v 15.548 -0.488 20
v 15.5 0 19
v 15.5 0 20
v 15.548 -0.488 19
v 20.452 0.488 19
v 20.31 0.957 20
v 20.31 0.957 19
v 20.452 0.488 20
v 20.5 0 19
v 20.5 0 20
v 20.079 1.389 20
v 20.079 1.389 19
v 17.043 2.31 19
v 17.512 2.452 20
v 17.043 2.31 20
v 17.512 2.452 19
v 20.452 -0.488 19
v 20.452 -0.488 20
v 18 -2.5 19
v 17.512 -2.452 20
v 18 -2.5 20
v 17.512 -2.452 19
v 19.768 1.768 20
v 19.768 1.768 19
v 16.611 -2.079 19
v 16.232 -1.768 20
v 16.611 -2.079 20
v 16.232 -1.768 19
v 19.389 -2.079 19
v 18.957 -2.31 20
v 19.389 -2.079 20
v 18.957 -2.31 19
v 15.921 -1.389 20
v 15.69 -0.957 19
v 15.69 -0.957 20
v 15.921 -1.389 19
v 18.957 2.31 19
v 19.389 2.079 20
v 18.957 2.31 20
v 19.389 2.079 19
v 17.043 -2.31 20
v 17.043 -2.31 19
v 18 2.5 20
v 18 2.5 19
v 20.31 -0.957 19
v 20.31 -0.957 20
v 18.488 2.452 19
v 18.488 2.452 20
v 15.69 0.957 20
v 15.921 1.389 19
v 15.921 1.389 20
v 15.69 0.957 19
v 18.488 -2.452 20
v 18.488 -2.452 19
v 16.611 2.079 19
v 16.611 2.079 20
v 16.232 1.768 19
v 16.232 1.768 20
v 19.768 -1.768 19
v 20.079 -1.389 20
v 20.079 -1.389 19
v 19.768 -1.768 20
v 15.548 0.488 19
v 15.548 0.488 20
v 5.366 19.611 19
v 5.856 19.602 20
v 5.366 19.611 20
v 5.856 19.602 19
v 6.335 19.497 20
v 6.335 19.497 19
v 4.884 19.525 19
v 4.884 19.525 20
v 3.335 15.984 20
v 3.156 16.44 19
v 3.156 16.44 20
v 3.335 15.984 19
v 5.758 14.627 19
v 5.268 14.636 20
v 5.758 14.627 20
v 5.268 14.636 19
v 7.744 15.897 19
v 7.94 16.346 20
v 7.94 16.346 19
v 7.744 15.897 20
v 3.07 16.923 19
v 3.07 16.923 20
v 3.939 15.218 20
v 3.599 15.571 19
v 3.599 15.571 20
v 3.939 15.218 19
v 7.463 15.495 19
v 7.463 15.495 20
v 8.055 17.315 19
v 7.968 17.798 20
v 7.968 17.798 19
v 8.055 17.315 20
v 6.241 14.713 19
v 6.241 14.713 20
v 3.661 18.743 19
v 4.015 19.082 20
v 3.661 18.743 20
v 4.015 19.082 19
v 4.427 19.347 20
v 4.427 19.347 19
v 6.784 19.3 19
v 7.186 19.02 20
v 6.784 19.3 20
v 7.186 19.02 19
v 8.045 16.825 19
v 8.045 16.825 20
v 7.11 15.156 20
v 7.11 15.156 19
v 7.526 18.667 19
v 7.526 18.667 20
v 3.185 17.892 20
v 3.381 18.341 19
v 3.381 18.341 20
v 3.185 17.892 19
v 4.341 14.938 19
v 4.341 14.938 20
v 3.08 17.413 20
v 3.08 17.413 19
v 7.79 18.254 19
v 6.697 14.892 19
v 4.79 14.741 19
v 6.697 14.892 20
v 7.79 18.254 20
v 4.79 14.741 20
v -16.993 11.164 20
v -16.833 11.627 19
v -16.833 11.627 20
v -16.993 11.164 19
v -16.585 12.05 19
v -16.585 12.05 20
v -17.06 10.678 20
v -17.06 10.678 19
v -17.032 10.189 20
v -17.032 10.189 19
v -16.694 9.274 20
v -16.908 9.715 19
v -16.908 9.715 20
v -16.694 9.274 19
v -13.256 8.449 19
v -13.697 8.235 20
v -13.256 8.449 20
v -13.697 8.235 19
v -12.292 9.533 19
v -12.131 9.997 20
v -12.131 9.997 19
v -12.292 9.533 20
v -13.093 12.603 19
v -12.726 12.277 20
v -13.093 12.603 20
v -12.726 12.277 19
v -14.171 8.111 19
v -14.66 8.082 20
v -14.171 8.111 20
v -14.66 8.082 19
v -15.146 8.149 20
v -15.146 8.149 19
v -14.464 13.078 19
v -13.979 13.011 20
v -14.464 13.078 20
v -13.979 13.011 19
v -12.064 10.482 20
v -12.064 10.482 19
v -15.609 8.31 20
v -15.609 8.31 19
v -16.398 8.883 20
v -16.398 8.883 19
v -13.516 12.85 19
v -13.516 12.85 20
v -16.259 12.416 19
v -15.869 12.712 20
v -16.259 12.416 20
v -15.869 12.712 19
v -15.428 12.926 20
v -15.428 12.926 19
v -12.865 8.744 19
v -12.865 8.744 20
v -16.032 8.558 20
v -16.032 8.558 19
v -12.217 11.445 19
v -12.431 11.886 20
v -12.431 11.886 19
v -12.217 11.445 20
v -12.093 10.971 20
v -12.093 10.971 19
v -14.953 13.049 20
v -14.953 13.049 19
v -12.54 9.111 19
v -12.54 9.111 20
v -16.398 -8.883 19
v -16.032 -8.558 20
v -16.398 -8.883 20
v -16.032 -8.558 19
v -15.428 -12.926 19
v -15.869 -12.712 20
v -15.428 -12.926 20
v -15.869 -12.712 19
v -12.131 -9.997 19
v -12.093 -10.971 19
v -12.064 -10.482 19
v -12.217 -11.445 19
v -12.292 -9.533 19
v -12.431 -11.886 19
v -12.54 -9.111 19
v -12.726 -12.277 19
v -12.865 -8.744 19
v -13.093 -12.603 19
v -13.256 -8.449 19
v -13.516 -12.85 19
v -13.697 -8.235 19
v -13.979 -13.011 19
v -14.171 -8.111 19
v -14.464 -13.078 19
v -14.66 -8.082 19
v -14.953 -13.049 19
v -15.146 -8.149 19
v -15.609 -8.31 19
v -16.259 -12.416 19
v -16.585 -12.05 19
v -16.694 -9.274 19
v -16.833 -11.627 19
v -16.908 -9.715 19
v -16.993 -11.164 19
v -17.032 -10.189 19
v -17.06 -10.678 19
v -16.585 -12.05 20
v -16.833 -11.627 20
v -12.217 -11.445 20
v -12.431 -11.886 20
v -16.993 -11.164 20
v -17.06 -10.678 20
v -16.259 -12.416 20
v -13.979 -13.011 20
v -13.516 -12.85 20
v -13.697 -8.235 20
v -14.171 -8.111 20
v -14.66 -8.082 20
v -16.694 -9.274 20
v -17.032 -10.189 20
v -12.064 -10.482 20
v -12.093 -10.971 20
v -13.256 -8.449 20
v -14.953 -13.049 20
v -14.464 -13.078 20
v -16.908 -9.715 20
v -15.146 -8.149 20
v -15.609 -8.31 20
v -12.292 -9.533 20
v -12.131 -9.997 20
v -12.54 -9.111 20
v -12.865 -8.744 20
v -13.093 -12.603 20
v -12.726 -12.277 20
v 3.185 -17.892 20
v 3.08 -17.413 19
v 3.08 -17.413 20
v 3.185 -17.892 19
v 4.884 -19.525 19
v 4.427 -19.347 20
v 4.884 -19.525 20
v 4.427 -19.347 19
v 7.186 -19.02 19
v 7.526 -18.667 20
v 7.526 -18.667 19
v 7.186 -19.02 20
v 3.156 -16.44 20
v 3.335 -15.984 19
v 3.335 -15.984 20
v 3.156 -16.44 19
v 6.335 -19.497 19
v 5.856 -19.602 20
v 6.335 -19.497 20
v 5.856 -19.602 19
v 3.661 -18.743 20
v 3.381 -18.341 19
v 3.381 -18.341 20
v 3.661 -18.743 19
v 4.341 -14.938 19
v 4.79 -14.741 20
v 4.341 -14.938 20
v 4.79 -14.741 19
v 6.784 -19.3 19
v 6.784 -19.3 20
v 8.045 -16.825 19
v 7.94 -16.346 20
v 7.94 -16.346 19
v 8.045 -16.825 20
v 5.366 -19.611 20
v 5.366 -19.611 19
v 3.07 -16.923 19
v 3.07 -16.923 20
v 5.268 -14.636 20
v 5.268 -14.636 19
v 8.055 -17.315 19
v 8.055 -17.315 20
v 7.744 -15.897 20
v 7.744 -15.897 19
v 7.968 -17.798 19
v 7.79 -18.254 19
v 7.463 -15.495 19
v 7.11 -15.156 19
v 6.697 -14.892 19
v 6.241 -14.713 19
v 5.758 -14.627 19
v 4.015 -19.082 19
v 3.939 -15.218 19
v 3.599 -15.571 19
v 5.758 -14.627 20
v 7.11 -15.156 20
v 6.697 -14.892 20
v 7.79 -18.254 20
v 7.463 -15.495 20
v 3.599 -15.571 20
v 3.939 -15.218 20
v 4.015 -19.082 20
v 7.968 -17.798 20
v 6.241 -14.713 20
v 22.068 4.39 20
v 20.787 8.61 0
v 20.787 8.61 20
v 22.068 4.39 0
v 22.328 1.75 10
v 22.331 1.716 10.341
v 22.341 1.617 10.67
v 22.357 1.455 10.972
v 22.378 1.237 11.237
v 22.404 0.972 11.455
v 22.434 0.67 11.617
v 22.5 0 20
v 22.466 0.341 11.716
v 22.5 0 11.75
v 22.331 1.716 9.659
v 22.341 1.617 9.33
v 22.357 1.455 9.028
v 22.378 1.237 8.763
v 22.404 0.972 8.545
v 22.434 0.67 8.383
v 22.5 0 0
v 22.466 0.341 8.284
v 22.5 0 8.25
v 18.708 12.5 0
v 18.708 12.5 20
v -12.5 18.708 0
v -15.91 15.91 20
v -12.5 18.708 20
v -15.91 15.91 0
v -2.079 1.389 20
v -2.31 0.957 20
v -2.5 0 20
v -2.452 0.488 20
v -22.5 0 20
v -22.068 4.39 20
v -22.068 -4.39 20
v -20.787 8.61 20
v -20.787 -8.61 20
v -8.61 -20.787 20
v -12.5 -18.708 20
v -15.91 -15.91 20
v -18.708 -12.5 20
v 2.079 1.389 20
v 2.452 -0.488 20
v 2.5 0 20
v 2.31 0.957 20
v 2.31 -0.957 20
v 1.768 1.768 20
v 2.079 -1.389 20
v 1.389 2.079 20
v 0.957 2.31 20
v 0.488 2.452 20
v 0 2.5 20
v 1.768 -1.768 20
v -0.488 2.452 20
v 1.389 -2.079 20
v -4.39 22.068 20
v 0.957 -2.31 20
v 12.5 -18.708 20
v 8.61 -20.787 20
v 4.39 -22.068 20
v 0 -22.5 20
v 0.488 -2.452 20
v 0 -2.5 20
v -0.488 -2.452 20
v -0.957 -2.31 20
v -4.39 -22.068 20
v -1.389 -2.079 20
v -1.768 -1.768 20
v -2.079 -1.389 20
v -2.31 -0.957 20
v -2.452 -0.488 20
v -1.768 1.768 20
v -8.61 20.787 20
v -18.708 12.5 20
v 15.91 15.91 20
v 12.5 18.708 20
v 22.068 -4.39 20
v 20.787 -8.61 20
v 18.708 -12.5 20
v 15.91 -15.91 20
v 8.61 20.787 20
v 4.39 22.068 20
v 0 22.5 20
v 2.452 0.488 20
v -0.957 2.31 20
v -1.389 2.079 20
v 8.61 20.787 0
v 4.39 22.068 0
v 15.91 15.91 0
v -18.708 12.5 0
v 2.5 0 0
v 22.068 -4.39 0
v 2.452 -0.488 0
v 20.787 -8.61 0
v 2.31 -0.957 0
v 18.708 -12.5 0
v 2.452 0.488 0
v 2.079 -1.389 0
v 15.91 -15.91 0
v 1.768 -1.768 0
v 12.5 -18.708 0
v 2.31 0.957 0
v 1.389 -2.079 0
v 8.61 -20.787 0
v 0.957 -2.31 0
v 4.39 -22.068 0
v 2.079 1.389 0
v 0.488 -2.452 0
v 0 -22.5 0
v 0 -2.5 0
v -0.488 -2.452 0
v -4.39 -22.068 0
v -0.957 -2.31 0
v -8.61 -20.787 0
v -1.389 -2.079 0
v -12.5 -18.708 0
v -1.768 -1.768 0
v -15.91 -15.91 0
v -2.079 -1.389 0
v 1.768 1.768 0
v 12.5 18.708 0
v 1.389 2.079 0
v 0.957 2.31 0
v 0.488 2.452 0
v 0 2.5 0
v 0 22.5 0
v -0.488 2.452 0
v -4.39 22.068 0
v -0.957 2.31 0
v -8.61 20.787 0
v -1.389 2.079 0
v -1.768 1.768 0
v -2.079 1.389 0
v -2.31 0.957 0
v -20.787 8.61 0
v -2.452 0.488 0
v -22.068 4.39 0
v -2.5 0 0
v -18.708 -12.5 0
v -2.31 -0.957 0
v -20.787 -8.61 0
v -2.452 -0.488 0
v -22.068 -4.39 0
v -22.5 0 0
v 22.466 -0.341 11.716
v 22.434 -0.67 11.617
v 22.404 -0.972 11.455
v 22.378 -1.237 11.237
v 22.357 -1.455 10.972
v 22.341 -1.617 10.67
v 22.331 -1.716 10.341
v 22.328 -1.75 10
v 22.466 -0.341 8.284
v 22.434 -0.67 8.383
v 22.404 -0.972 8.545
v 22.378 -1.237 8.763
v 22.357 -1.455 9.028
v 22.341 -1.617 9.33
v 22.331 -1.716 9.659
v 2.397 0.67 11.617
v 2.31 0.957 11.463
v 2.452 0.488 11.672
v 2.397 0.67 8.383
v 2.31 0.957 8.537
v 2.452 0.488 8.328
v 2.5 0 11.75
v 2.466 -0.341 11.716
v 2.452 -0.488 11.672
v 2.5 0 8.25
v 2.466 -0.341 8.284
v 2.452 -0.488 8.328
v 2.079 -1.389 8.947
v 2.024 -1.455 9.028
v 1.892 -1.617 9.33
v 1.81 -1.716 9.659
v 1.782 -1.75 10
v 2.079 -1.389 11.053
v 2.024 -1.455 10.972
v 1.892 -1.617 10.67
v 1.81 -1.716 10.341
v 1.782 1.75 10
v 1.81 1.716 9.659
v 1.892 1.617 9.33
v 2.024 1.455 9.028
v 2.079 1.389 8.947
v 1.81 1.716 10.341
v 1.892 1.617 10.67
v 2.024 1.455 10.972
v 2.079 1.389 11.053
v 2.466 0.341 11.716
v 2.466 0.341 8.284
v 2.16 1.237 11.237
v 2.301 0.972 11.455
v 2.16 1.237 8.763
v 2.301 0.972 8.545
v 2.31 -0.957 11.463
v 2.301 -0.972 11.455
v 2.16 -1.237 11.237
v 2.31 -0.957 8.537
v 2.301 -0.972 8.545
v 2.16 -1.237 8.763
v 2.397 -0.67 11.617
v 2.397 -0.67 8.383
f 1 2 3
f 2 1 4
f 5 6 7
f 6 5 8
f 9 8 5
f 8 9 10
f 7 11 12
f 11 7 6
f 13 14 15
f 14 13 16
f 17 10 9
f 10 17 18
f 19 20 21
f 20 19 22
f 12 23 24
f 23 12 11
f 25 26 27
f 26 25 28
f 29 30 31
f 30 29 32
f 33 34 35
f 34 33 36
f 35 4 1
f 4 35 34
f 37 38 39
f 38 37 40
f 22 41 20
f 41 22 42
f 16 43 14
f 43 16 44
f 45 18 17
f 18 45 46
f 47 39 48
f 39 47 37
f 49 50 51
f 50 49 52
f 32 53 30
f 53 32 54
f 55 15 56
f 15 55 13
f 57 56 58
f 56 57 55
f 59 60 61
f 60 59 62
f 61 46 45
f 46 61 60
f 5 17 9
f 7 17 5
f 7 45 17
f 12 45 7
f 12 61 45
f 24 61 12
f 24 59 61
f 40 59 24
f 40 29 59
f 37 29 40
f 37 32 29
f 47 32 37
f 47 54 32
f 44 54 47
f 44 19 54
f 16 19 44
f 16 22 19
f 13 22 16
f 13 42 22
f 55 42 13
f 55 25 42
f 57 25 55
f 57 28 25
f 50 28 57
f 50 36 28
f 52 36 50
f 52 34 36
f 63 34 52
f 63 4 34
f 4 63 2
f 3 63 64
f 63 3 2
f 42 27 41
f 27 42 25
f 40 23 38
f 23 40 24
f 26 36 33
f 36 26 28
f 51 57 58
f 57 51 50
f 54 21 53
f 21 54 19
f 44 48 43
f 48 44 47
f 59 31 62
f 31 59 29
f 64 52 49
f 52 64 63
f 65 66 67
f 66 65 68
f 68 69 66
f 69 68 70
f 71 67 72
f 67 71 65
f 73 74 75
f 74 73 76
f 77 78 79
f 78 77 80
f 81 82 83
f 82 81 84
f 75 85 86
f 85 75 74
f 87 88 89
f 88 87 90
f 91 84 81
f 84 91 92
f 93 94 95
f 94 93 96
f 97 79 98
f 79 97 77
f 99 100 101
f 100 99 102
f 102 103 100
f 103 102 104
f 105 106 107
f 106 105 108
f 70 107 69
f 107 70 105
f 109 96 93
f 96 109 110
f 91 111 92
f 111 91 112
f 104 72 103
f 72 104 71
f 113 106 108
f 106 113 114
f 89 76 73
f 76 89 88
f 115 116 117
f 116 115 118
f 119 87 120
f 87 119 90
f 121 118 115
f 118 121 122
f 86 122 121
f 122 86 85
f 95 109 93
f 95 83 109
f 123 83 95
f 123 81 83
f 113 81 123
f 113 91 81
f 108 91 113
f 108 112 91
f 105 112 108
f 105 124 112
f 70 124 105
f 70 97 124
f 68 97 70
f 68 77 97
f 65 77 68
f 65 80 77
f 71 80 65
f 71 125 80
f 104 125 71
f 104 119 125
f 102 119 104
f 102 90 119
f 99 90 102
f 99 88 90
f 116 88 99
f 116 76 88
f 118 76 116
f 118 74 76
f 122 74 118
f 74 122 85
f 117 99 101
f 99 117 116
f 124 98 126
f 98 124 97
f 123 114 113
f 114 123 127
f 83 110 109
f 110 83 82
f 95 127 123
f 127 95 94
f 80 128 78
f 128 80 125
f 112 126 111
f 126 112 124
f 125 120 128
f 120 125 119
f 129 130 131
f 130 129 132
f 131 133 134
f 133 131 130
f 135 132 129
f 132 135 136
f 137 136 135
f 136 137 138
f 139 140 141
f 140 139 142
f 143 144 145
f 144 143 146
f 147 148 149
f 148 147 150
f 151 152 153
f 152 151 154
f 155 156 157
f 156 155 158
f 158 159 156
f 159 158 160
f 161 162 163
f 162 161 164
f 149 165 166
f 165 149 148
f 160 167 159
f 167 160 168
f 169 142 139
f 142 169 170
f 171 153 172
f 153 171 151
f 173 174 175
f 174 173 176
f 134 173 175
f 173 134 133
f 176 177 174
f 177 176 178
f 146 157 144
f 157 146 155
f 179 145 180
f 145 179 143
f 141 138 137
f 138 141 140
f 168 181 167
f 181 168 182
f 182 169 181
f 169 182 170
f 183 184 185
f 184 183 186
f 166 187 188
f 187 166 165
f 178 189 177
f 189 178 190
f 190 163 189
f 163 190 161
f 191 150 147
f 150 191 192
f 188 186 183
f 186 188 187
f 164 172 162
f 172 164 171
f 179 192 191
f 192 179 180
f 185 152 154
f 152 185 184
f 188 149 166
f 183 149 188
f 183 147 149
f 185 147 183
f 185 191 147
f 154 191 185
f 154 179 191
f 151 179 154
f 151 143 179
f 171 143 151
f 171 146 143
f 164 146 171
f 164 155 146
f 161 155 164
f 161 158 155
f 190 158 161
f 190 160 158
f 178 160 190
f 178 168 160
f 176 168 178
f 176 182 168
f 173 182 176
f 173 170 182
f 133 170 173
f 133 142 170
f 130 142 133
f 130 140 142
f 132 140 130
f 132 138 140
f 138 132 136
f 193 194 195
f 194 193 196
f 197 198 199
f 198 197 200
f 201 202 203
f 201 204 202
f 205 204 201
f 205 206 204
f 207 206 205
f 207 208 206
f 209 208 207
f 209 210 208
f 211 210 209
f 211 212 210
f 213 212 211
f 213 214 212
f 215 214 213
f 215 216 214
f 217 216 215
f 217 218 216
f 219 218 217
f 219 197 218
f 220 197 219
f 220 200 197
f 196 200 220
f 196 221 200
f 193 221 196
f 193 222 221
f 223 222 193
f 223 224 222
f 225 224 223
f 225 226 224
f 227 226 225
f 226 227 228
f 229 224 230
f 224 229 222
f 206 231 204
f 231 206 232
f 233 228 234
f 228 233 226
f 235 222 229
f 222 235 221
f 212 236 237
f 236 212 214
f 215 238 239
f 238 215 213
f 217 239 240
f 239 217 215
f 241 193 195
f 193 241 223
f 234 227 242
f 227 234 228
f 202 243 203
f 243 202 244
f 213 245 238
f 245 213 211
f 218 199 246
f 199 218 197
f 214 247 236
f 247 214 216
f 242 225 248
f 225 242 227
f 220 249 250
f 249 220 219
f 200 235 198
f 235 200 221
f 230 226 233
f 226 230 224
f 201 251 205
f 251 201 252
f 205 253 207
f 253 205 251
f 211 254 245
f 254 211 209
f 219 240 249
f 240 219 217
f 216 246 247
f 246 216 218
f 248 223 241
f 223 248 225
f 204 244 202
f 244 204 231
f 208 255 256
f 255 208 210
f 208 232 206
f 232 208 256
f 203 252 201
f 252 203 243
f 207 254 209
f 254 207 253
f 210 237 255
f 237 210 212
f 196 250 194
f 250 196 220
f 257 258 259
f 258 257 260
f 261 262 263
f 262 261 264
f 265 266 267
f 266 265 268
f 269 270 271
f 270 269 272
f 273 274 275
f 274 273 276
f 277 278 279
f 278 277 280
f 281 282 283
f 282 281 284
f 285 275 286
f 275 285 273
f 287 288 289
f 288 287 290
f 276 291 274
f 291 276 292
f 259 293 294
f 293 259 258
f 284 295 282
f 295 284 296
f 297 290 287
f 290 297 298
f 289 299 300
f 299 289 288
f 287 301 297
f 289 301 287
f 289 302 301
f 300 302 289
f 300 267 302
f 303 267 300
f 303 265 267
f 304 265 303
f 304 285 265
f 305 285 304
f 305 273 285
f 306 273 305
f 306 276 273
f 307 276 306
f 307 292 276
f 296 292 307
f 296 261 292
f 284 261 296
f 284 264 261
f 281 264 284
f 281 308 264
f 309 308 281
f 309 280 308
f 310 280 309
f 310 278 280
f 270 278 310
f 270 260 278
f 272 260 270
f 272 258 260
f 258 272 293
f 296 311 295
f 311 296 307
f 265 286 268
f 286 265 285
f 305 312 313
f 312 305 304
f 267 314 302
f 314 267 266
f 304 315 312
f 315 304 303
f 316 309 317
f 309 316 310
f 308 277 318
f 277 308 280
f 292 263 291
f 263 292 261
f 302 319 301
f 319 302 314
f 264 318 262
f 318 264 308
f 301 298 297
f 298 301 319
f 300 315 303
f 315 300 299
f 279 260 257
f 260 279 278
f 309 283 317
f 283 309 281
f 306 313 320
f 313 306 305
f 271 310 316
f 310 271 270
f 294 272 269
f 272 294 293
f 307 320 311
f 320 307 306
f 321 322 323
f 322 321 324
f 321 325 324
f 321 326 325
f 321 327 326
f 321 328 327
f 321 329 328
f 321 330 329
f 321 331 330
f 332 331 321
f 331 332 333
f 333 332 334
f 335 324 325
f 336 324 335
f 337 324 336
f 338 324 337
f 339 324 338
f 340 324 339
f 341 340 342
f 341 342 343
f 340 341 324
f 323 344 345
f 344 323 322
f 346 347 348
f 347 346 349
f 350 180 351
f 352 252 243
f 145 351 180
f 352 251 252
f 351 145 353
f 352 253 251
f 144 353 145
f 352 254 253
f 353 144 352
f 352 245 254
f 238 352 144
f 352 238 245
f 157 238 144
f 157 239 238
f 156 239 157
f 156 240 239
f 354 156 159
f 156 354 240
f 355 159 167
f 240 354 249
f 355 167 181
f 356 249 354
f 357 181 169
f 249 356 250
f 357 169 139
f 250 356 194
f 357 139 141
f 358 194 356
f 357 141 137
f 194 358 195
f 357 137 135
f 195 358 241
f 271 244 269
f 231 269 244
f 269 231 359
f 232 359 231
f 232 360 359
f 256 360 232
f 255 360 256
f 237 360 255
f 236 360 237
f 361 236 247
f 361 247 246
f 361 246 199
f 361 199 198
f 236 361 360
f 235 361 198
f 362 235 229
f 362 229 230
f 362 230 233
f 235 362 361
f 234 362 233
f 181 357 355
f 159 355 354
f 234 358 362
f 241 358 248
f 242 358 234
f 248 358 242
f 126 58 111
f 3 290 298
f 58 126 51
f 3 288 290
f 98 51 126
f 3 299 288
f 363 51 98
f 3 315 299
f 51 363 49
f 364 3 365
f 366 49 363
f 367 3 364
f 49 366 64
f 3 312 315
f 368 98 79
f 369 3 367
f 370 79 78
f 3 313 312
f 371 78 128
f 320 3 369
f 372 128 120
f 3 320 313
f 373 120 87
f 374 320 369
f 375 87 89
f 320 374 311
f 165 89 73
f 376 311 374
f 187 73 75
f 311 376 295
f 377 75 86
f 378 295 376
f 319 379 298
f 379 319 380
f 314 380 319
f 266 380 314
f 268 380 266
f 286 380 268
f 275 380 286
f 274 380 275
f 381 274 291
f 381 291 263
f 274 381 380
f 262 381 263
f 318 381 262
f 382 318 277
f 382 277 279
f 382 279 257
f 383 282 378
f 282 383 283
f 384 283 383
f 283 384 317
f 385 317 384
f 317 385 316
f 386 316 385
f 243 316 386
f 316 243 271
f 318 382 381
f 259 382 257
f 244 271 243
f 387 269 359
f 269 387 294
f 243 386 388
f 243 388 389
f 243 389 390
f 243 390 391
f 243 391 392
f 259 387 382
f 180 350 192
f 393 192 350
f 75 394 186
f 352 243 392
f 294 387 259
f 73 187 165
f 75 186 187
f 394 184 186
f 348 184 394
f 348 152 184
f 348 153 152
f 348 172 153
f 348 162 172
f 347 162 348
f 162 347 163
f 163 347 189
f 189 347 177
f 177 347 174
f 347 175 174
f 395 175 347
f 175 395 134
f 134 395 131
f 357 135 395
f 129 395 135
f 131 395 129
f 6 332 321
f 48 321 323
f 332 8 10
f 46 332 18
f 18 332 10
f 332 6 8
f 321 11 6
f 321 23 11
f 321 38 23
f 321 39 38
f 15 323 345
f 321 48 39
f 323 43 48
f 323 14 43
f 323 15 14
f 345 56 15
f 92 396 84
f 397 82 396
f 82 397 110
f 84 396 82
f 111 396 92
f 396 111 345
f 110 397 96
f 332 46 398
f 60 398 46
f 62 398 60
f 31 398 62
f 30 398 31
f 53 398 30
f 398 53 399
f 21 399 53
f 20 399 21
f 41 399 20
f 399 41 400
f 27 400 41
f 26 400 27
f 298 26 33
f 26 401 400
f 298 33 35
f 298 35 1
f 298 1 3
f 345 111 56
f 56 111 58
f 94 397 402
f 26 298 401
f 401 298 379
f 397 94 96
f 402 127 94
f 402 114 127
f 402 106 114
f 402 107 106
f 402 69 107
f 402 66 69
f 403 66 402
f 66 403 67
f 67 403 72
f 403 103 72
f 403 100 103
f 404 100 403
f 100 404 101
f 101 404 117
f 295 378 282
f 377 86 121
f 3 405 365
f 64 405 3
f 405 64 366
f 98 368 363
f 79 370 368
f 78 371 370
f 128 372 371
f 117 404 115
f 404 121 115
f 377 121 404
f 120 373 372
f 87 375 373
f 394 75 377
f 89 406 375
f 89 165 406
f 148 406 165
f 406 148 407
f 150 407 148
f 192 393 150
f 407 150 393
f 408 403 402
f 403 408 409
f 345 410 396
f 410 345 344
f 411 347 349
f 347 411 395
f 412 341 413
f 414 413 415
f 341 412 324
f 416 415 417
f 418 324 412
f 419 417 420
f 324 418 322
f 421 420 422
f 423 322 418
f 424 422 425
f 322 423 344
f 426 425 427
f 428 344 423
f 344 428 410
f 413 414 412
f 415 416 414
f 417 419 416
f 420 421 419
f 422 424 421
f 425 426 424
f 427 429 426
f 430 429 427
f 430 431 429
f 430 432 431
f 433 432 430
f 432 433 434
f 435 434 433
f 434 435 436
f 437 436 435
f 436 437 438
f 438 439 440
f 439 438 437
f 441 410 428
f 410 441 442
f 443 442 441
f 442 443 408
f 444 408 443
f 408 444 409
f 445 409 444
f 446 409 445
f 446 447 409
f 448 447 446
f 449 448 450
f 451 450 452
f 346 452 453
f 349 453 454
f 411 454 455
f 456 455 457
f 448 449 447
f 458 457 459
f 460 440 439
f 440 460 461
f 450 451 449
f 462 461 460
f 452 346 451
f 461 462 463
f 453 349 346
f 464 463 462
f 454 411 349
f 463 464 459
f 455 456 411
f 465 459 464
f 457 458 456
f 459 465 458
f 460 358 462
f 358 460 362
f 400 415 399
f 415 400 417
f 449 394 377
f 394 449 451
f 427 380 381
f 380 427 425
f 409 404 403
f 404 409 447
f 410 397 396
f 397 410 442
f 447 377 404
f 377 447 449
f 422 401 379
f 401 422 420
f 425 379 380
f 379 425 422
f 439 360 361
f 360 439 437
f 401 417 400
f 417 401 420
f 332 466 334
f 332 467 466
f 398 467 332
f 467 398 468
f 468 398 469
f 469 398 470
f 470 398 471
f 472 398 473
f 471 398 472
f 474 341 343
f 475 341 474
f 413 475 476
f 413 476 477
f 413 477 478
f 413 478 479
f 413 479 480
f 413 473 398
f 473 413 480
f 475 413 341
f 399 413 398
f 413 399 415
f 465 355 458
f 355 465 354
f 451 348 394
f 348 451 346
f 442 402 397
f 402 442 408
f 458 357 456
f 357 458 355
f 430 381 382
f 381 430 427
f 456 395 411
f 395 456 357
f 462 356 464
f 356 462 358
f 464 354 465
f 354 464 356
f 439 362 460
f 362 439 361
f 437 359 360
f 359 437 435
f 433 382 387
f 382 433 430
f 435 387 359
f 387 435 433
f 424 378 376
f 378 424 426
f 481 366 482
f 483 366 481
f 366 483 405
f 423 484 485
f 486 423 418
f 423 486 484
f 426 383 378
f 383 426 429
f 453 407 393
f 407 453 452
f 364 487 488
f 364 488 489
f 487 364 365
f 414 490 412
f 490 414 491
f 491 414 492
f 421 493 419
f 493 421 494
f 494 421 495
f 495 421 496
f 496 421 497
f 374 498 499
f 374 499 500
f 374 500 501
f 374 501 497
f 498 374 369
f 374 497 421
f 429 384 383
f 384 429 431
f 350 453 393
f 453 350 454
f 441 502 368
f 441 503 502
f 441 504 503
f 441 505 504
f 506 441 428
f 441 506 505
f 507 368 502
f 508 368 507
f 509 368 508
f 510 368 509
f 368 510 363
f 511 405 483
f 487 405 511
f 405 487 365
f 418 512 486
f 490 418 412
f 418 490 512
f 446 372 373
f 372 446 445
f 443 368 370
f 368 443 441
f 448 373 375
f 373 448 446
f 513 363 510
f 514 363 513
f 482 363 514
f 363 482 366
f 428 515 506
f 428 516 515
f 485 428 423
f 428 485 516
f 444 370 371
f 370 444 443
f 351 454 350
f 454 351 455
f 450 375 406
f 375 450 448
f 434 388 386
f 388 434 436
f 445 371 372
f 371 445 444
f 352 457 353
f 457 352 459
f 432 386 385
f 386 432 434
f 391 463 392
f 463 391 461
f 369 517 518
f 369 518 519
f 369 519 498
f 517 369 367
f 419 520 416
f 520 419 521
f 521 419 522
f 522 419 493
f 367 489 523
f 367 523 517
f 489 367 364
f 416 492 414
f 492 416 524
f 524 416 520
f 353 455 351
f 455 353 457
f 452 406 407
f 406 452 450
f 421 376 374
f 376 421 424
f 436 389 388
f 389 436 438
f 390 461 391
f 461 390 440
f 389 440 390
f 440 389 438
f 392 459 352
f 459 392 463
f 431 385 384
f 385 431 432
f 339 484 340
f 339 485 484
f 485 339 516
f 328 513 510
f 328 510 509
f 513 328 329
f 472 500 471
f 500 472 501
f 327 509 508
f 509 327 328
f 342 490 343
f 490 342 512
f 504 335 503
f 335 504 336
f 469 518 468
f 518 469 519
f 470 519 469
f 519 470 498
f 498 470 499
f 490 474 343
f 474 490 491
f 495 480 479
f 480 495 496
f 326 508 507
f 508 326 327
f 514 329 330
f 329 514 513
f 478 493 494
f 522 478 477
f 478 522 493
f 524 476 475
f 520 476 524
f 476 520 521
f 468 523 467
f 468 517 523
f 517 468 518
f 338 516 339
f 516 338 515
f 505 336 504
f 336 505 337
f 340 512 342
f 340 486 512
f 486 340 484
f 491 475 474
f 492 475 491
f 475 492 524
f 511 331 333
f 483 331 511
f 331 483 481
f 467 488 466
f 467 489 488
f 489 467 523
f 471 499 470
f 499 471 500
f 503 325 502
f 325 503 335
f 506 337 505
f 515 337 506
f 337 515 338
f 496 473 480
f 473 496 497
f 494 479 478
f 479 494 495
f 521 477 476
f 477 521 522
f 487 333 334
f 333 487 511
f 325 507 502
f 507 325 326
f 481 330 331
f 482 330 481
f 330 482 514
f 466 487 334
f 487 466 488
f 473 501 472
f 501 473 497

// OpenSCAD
$fn = 32;

// ----------------------------------------------------------------------
// Control knob: dimpled knob
// ----------------------------------------------------------------------

// --- parameters (mm) ---
dimp_d = 5;               // finger dimple diameter
n_dimp = 5;               // number of dimples
dimp_r = 18;              // dimple ring radius
knob_d = 45;              // knob body diameter
knob_h = 20;              // knob body height
bore_d = 5;               // shaft bore diameter
set_d = 3.5;              // set screw bore diameter

dimp_step = 360 / n_dimp;  // dimple angular step

difference() {
  cylinder(h = knob_h, d = knob_d);
  translate([0, 0, -1]) cylinder(h = knob_h + 2, d = bore_d);
  translate([-1, 0, knob_h / 2]) rotate([0, 90, 0])
    cylinder(h = knob_d / 2 + bore_d / 2 + 2, d = set_d);  for (i = [0 : n_dimp - 1])
    rotate([0, 0, i * dimp_step])
      translate([dimp_r, 0, knob_h - 1])
        cylinder(h = 2, d = dimp_d);
}
